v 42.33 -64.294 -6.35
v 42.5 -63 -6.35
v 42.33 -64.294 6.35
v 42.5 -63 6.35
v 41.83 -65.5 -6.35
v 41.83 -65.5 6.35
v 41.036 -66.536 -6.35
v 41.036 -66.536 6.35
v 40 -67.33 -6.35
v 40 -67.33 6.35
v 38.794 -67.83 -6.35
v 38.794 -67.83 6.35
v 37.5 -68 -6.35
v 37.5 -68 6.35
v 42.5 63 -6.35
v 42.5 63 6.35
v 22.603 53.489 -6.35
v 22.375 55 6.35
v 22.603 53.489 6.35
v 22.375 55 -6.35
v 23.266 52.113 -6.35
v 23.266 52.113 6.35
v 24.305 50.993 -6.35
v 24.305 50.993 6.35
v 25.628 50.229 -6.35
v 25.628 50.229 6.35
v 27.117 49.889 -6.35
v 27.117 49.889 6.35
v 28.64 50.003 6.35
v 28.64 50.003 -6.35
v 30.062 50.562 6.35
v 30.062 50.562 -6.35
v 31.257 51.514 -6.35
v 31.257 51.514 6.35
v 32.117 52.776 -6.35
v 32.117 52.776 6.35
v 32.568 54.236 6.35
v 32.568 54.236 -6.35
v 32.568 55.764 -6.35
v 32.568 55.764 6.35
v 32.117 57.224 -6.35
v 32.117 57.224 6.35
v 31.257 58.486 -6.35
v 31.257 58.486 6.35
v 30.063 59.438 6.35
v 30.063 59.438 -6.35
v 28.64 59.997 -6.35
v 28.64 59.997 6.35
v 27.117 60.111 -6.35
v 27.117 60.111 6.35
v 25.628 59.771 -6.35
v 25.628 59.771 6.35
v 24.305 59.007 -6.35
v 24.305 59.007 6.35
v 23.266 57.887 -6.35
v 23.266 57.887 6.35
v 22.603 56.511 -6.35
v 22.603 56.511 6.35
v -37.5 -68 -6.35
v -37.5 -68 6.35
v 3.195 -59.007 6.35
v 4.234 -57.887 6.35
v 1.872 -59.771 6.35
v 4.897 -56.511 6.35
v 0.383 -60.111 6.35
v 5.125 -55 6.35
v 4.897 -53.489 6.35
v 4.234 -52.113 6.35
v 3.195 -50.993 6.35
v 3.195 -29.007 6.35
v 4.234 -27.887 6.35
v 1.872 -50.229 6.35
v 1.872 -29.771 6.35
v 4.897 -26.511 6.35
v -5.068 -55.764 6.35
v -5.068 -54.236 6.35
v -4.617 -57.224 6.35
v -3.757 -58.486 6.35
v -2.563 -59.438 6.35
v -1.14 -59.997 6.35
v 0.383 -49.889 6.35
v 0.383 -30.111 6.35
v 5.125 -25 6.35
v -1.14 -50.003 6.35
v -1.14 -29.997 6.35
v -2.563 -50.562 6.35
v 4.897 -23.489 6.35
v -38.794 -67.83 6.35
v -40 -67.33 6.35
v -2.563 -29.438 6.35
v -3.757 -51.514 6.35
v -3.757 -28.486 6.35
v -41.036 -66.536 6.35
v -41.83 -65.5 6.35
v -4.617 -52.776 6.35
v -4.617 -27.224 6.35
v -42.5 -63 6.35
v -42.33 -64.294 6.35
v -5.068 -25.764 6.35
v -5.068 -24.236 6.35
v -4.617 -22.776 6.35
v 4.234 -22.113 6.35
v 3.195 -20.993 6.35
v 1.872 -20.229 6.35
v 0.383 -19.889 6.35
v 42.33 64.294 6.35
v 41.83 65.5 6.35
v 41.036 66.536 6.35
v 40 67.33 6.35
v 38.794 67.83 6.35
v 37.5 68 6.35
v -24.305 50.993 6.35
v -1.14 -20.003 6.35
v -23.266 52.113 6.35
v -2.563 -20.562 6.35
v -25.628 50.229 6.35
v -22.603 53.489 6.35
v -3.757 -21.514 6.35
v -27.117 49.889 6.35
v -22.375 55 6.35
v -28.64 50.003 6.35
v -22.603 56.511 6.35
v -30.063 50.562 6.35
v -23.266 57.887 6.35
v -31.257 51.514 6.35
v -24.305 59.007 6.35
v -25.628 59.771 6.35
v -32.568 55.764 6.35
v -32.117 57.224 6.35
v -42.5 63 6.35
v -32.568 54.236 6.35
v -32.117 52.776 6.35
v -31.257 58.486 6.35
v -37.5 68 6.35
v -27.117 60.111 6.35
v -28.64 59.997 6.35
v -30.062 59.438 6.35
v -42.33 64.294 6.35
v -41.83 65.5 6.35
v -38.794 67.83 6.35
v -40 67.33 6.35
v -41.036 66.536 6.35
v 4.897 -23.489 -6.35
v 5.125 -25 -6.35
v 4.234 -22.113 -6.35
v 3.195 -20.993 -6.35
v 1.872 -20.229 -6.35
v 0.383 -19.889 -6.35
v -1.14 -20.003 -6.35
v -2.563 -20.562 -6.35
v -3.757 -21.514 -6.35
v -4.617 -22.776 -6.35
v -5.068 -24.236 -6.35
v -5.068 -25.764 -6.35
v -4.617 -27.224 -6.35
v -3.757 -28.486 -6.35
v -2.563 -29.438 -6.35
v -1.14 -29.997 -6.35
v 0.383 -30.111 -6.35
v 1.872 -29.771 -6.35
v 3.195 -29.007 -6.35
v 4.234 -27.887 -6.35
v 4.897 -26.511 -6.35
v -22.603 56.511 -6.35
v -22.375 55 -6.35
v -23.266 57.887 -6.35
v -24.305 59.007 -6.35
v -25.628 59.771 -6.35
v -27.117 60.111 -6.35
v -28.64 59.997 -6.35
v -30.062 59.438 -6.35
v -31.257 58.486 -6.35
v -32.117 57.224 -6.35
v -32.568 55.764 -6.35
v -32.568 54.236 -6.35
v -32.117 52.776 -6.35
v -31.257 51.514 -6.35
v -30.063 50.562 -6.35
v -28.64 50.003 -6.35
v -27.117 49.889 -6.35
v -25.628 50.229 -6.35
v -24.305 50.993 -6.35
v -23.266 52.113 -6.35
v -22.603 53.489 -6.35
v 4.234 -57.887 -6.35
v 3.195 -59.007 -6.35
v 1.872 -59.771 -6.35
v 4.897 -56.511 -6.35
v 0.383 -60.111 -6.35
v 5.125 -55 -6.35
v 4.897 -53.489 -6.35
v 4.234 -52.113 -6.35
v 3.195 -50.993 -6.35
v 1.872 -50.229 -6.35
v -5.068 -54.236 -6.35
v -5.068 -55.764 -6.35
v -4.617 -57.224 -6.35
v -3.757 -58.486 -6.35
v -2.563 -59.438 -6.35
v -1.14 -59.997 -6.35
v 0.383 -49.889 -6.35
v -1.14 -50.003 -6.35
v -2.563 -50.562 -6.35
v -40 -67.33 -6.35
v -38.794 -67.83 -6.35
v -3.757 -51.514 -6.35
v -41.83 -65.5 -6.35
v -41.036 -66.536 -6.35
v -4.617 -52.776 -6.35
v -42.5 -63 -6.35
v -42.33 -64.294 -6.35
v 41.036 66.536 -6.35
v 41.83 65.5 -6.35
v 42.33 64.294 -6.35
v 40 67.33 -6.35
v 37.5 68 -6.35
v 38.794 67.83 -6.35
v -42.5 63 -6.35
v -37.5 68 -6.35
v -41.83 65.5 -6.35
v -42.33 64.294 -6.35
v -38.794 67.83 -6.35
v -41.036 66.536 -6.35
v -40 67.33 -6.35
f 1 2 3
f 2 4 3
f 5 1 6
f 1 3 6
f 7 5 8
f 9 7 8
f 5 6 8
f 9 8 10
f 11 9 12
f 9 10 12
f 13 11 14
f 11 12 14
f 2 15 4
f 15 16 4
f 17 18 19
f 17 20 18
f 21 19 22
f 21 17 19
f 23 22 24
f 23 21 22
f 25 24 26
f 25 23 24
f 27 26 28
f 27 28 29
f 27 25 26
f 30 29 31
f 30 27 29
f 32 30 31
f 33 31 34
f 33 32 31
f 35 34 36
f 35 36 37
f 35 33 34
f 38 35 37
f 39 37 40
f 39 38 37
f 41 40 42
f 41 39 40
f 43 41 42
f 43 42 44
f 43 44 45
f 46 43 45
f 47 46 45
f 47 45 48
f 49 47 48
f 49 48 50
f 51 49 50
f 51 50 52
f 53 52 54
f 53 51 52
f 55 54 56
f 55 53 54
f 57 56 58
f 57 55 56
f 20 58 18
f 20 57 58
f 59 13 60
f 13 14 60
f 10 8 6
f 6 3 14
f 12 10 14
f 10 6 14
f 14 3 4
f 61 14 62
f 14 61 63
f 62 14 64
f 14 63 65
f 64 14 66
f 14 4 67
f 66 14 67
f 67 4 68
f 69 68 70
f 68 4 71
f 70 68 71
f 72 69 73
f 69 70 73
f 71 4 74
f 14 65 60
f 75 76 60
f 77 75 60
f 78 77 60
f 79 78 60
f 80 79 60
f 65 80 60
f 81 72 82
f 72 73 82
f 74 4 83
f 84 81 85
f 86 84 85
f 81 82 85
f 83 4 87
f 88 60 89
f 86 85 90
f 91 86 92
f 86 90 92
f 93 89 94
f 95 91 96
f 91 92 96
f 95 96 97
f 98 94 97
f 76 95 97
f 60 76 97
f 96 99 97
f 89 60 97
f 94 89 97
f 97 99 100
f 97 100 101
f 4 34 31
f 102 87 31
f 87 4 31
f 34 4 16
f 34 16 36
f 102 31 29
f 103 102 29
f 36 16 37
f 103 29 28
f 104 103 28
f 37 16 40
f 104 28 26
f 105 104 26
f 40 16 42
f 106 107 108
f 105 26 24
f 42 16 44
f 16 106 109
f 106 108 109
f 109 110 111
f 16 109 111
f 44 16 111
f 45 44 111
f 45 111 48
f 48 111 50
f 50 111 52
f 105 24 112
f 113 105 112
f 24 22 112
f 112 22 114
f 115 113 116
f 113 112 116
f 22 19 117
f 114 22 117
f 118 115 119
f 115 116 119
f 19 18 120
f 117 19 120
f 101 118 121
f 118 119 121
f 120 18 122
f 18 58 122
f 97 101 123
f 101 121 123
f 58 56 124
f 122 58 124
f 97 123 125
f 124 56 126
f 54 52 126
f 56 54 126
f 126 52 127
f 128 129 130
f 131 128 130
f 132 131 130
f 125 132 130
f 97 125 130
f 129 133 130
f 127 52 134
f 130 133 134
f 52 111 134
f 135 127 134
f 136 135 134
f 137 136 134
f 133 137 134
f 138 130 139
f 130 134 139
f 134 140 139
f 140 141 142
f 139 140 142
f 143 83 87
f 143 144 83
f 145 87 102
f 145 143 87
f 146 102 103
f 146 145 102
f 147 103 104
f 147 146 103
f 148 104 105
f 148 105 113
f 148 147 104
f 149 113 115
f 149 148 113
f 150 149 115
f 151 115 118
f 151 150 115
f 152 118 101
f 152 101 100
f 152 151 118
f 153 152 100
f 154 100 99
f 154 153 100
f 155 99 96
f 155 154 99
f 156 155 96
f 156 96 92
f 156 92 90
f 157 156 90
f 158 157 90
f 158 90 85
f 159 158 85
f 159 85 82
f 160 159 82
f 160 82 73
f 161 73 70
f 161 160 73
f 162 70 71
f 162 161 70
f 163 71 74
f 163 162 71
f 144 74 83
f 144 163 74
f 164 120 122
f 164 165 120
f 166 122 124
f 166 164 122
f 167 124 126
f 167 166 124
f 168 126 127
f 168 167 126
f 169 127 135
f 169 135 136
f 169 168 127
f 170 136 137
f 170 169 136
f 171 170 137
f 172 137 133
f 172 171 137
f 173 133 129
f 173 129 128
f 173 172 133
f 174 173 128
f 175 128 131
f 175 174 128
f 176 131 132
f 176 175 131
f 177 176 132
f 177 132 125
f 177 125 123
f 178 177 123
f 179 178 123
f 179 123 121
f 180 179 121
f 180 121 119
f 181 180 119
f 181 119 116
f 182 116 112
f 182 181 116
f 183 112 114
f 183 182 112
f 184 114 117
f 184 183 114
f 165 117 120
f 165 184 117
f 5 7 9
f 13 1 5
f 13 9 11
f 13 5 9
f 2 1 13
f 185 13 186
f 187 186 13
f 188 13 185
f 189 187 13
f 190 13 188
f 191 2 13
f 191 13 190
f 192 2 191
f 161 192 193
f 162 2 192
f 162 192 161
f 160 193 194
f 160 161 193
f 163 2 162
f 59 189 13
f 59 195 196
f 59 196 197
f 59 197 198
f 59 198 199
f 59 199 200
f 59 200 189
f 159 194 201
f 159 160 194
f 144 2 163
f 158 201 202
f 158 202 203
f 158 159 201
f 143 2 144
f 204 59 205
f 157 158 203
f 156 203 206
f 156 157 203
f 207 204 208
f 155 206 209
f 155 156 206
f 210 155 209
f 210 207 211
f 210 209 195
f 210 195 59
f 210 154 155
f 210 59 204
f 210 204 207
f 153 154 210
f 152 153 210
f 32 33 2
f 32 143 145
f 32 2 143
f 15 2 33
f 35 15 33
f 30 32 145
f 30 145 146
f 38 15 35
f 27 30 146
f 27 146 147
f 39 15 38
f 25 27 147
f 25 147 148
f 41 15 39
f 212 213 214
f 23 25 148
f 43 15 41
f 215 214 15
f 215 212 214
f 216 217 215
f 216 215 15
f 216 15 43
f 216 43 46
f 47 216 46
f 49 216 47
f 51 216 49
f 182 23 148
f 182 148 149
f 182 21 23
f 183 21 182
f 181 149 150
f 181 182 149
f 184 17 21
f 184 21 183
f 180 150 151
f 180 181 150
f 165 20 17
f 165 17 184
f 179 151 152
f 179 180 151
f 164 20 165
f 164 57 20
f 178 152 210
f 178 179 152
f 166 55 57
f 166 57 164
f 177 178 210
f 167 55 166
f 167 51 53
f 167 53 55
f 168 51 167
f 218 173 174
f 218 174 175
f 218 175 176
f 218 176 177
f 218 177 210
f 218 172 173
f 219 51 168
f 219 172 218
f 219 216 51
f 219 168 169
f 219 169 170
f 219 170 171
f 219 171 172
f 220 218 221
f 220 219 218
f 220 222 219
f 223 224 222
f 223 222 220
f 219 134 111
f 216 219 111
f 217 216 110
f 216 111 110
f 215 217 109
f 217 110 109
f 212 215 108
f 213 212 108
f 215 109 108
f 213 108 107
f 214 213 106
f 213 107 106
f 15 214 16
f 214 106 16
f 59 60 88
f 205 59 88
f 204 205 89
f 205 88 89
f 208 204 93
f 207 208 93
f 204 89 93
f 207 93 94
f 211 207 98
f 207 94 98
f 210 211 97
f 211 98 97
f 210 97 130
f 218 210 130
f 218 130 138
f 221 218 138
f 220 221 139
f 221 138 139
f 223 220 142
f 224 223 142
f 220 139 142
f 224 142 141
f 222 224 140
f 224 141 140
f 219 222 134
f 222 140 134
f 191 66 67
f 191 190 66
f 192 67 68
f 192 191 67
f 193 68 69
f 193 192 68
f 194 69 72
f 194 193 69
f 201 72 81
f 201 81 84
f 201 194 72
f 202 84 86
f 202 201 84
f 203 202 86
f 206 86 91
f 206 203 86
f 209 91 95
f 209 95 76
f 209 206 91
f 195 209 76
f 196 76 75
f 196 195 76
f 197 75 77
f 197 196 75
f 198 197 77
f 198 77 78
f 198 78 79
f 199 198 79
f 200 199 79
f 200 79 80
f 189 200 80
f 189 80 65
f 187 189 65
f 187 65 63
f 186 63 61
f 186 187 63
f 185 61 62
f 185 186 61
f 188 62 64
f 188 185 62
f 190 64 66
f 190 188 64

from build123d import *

# Parameters (mm, degrees)
CROQUIS1_R              = 5.125
SALIENTE_EXTRUIR1_DEPTH = 6.35


with BuildPart() as part:
    # Croquis1 → Saliente-Extruir1 (new, symmetric)
    with BuildSketch(Plane.XY):
        with BuildLine():
            Line((-37.5, 68), (37.5, 68))
            ThreePointArc((37.5, 68), (41.035533906, 66.535533906), (42.5, 63))
            Line((42.5, 63), (42.5, -63))
            ThreePointArc((42.5, -63), (41.035533906, -66.535533906), (37.5, -68))
            Line((37.5, -68), (-37.5, -68))
            ThreePointArc((-37.5, -68), (-41.035533906, -66.535533906), (-42.5, -63))
            Line((-42.5, -63), (-42.5, 63))
            ThreePointArc((-42.5, 63), (-41.035533906, 66.535533906), (-37.5, 68))
        make_face()
        with Locations((-27.5, 55)):
            Circle(CROQUIS1_R, mode=Mode.SUBTRACT)
        with Locations(Location((27.5, 55, 0), (0, 0, 180))):
            Circle(CROQUIS1_R, mode=Mode.SUBTRACT)
        with Locations((0, -55)):
            Circle(CROQUIS1_R, mode=Mode.SUBTRACT)
        with Locations((0, -25)):
            Circle(CROQUIS1_R, mode=Mode.SUBTRACT)
    extrude(amount=SALIENTE_EXTRUIR1_DEPTH, both=True)


solid = part.part
